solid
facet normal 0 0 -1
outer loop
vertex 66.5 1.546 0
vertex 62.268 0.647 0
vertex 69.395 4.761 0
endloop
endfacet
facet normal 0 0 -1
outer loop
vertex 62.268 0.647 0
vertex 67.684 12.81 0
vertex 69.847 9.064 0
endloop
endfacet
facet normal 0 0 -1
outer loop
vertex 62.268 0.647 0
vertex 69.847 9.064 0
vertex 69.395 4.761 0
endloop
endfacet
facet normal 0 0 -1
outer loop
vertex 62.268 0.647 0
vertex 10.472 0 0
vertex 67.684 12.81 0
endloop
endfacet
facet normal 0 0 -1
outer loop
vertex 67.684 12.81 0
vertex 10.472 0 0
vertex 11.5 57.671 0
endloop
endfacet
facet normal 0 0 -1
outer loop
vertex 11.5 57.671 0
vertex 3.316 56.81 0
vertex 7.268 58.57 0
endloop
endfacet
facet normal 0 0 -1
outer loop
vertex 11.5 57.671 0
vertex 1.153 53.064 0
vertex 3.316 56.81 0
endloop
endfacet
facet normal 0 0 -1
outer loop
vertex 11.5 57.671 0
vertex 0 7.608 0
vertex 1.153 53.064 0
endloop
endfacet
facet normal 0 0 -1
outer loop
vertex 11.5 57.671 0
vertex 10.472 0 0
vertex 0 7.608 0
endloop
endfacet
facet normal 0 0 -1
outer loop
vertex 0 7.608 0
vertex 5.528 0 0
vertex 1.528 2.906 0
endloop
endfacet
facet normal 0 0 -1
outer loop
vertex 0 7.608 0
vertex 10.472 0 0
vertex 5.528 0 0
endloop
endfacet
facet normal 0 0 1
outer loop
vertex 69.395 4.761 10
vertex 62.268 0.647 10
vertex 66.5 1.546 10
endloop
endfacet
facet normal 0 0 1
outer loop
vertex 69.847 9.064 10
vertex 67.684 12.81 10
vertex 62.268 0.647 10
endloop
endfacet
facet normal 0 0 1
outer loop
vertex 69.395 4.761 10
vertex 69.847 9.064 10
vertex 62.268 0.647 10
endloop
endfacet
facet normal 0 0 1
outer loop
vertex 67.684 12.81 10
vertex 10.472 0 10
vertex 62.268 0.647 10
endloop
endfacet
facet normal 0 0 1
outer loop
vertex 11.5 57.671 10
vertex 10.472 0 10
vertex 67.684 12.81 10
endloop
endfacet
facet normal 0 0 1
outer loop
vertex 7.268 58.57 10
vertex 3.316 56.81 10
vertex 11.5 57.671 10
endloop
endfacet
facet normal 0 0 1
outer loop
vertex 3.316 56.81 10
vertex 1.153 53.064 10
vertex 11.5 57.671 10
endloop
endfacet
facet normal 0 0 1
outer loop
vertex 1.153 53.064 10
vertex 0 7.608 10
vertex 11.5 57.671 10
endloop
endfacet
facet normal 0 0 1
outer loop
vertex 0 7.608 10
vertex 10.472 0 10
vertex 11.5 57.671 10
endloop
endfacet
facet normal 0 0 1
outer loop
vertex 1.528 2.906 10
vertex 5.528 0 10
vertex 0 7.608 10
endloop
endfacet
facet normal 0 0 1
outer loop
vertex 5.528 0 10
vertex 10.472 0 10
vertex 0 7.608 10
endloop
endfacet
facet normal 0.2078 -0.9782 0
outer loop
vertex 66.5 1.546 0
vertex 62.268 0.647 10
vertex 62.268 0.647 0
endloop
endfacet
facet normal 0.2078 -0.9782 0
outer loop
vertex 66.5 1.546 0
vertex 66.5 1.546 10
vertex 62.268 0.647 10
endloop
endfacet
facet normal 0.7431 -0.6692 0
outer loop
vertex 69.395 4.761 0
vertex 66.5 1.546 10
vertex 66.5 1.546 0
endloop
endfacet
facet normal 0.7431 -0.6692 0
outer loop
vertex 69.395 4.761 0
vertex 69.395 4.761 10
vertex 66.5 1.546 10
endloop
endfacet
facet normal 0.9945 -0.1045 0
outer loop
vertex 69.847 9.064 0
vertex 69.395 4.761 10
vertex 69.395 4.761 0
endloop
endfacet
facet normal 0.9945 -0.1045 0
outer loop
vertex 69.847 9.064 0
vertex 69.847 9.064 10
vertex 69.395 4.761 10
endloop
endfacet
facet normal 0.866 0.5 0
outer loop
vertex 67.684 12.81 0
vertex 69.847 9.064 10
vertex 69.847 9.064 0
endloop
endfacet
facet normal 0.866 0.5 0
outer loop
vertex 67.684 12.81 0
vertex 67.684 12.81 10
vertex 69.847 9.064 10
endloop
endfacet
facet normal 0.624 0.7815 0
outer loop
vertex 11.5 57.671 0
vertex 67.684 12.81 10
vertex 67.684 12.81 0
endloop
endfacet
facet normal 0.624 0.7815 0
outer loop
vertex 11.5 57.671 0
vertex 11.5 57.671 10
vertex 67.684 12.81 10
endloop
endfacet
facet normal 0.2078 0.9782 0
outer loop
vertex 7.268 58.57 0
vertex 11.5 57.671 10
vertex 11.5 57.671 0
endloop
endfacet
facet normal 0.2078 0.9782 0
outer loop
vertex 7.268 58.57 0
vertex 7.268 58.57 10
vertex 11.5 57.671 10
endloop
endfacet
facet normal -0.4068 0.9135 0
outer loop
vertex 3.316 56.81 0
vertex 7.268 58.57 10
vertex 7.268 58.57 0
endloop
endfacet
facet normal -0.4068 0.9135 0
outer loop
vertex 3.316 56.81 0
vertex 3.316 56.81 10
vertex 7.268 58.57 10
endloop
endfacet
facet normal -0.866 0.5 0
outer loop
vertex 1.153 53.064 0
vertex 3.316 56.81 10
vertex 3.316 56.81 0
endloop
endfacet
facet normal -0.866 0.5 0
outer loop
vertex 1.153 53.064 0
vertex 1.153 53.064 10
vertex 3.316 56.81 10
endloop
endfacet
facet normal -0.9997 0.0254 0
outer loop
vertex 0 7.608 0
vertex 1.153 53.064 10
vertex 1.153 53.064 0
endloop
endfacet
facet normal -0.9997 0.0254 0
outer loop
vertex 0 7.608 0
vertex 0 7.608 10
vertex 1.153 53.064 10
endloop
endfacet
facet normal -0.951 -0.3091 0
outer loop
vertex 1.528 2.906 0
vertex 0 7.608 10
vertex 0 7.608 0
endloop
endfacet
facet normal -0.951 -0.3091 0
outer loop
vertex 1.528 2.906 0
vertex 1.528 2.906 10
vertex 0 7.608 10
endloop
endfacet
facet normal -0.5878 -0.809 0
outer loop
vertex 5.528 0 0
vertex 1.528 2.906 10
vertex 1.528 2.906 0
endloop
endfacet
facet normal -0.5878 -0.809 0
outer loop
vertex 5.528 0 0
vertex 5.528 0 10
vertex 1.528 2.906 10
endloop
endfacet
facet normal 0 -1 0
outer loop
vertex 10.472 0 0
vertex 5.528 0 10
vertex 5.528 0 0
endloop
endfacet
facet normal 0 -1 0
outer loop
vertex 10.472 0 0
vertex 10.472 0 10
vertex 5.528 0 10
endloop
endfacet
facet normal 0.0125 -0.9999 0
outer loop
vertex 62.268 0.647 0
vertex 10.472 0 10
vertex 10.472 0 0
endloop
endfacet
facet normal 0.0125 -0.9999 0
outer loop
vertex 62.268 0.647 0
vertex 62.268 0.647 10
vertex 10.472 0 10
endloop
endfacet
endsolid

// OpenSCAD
$fn = 32;

// ----------------------------------------------------------------------
// Lever arm: two bosses 16 and 14 mm, 55 mm between centres
// ----------------------------------------------------------------------

// --- parameters (mm) ---
profile_height = 10;      // extrusion height
profile_points = 13;      // points of the closed outline

profile = [[0, 7.608], [1.528, 2.906], [5.528, 0], [10.472, 0], [62.268, 0.647], [66.5, 1.546], [69.395, 4.761], [69.847, 9.064], [67.684, 12.81], [11.5, 57.671], [7.268, 58.57], [3.316, 56.81], [1.153, 53.064]];  // single closed polygon, 13 points, counter clockwise

// --- the one profile operation ---
linear_extrude(height = profile_height) polygon(points = profile);
